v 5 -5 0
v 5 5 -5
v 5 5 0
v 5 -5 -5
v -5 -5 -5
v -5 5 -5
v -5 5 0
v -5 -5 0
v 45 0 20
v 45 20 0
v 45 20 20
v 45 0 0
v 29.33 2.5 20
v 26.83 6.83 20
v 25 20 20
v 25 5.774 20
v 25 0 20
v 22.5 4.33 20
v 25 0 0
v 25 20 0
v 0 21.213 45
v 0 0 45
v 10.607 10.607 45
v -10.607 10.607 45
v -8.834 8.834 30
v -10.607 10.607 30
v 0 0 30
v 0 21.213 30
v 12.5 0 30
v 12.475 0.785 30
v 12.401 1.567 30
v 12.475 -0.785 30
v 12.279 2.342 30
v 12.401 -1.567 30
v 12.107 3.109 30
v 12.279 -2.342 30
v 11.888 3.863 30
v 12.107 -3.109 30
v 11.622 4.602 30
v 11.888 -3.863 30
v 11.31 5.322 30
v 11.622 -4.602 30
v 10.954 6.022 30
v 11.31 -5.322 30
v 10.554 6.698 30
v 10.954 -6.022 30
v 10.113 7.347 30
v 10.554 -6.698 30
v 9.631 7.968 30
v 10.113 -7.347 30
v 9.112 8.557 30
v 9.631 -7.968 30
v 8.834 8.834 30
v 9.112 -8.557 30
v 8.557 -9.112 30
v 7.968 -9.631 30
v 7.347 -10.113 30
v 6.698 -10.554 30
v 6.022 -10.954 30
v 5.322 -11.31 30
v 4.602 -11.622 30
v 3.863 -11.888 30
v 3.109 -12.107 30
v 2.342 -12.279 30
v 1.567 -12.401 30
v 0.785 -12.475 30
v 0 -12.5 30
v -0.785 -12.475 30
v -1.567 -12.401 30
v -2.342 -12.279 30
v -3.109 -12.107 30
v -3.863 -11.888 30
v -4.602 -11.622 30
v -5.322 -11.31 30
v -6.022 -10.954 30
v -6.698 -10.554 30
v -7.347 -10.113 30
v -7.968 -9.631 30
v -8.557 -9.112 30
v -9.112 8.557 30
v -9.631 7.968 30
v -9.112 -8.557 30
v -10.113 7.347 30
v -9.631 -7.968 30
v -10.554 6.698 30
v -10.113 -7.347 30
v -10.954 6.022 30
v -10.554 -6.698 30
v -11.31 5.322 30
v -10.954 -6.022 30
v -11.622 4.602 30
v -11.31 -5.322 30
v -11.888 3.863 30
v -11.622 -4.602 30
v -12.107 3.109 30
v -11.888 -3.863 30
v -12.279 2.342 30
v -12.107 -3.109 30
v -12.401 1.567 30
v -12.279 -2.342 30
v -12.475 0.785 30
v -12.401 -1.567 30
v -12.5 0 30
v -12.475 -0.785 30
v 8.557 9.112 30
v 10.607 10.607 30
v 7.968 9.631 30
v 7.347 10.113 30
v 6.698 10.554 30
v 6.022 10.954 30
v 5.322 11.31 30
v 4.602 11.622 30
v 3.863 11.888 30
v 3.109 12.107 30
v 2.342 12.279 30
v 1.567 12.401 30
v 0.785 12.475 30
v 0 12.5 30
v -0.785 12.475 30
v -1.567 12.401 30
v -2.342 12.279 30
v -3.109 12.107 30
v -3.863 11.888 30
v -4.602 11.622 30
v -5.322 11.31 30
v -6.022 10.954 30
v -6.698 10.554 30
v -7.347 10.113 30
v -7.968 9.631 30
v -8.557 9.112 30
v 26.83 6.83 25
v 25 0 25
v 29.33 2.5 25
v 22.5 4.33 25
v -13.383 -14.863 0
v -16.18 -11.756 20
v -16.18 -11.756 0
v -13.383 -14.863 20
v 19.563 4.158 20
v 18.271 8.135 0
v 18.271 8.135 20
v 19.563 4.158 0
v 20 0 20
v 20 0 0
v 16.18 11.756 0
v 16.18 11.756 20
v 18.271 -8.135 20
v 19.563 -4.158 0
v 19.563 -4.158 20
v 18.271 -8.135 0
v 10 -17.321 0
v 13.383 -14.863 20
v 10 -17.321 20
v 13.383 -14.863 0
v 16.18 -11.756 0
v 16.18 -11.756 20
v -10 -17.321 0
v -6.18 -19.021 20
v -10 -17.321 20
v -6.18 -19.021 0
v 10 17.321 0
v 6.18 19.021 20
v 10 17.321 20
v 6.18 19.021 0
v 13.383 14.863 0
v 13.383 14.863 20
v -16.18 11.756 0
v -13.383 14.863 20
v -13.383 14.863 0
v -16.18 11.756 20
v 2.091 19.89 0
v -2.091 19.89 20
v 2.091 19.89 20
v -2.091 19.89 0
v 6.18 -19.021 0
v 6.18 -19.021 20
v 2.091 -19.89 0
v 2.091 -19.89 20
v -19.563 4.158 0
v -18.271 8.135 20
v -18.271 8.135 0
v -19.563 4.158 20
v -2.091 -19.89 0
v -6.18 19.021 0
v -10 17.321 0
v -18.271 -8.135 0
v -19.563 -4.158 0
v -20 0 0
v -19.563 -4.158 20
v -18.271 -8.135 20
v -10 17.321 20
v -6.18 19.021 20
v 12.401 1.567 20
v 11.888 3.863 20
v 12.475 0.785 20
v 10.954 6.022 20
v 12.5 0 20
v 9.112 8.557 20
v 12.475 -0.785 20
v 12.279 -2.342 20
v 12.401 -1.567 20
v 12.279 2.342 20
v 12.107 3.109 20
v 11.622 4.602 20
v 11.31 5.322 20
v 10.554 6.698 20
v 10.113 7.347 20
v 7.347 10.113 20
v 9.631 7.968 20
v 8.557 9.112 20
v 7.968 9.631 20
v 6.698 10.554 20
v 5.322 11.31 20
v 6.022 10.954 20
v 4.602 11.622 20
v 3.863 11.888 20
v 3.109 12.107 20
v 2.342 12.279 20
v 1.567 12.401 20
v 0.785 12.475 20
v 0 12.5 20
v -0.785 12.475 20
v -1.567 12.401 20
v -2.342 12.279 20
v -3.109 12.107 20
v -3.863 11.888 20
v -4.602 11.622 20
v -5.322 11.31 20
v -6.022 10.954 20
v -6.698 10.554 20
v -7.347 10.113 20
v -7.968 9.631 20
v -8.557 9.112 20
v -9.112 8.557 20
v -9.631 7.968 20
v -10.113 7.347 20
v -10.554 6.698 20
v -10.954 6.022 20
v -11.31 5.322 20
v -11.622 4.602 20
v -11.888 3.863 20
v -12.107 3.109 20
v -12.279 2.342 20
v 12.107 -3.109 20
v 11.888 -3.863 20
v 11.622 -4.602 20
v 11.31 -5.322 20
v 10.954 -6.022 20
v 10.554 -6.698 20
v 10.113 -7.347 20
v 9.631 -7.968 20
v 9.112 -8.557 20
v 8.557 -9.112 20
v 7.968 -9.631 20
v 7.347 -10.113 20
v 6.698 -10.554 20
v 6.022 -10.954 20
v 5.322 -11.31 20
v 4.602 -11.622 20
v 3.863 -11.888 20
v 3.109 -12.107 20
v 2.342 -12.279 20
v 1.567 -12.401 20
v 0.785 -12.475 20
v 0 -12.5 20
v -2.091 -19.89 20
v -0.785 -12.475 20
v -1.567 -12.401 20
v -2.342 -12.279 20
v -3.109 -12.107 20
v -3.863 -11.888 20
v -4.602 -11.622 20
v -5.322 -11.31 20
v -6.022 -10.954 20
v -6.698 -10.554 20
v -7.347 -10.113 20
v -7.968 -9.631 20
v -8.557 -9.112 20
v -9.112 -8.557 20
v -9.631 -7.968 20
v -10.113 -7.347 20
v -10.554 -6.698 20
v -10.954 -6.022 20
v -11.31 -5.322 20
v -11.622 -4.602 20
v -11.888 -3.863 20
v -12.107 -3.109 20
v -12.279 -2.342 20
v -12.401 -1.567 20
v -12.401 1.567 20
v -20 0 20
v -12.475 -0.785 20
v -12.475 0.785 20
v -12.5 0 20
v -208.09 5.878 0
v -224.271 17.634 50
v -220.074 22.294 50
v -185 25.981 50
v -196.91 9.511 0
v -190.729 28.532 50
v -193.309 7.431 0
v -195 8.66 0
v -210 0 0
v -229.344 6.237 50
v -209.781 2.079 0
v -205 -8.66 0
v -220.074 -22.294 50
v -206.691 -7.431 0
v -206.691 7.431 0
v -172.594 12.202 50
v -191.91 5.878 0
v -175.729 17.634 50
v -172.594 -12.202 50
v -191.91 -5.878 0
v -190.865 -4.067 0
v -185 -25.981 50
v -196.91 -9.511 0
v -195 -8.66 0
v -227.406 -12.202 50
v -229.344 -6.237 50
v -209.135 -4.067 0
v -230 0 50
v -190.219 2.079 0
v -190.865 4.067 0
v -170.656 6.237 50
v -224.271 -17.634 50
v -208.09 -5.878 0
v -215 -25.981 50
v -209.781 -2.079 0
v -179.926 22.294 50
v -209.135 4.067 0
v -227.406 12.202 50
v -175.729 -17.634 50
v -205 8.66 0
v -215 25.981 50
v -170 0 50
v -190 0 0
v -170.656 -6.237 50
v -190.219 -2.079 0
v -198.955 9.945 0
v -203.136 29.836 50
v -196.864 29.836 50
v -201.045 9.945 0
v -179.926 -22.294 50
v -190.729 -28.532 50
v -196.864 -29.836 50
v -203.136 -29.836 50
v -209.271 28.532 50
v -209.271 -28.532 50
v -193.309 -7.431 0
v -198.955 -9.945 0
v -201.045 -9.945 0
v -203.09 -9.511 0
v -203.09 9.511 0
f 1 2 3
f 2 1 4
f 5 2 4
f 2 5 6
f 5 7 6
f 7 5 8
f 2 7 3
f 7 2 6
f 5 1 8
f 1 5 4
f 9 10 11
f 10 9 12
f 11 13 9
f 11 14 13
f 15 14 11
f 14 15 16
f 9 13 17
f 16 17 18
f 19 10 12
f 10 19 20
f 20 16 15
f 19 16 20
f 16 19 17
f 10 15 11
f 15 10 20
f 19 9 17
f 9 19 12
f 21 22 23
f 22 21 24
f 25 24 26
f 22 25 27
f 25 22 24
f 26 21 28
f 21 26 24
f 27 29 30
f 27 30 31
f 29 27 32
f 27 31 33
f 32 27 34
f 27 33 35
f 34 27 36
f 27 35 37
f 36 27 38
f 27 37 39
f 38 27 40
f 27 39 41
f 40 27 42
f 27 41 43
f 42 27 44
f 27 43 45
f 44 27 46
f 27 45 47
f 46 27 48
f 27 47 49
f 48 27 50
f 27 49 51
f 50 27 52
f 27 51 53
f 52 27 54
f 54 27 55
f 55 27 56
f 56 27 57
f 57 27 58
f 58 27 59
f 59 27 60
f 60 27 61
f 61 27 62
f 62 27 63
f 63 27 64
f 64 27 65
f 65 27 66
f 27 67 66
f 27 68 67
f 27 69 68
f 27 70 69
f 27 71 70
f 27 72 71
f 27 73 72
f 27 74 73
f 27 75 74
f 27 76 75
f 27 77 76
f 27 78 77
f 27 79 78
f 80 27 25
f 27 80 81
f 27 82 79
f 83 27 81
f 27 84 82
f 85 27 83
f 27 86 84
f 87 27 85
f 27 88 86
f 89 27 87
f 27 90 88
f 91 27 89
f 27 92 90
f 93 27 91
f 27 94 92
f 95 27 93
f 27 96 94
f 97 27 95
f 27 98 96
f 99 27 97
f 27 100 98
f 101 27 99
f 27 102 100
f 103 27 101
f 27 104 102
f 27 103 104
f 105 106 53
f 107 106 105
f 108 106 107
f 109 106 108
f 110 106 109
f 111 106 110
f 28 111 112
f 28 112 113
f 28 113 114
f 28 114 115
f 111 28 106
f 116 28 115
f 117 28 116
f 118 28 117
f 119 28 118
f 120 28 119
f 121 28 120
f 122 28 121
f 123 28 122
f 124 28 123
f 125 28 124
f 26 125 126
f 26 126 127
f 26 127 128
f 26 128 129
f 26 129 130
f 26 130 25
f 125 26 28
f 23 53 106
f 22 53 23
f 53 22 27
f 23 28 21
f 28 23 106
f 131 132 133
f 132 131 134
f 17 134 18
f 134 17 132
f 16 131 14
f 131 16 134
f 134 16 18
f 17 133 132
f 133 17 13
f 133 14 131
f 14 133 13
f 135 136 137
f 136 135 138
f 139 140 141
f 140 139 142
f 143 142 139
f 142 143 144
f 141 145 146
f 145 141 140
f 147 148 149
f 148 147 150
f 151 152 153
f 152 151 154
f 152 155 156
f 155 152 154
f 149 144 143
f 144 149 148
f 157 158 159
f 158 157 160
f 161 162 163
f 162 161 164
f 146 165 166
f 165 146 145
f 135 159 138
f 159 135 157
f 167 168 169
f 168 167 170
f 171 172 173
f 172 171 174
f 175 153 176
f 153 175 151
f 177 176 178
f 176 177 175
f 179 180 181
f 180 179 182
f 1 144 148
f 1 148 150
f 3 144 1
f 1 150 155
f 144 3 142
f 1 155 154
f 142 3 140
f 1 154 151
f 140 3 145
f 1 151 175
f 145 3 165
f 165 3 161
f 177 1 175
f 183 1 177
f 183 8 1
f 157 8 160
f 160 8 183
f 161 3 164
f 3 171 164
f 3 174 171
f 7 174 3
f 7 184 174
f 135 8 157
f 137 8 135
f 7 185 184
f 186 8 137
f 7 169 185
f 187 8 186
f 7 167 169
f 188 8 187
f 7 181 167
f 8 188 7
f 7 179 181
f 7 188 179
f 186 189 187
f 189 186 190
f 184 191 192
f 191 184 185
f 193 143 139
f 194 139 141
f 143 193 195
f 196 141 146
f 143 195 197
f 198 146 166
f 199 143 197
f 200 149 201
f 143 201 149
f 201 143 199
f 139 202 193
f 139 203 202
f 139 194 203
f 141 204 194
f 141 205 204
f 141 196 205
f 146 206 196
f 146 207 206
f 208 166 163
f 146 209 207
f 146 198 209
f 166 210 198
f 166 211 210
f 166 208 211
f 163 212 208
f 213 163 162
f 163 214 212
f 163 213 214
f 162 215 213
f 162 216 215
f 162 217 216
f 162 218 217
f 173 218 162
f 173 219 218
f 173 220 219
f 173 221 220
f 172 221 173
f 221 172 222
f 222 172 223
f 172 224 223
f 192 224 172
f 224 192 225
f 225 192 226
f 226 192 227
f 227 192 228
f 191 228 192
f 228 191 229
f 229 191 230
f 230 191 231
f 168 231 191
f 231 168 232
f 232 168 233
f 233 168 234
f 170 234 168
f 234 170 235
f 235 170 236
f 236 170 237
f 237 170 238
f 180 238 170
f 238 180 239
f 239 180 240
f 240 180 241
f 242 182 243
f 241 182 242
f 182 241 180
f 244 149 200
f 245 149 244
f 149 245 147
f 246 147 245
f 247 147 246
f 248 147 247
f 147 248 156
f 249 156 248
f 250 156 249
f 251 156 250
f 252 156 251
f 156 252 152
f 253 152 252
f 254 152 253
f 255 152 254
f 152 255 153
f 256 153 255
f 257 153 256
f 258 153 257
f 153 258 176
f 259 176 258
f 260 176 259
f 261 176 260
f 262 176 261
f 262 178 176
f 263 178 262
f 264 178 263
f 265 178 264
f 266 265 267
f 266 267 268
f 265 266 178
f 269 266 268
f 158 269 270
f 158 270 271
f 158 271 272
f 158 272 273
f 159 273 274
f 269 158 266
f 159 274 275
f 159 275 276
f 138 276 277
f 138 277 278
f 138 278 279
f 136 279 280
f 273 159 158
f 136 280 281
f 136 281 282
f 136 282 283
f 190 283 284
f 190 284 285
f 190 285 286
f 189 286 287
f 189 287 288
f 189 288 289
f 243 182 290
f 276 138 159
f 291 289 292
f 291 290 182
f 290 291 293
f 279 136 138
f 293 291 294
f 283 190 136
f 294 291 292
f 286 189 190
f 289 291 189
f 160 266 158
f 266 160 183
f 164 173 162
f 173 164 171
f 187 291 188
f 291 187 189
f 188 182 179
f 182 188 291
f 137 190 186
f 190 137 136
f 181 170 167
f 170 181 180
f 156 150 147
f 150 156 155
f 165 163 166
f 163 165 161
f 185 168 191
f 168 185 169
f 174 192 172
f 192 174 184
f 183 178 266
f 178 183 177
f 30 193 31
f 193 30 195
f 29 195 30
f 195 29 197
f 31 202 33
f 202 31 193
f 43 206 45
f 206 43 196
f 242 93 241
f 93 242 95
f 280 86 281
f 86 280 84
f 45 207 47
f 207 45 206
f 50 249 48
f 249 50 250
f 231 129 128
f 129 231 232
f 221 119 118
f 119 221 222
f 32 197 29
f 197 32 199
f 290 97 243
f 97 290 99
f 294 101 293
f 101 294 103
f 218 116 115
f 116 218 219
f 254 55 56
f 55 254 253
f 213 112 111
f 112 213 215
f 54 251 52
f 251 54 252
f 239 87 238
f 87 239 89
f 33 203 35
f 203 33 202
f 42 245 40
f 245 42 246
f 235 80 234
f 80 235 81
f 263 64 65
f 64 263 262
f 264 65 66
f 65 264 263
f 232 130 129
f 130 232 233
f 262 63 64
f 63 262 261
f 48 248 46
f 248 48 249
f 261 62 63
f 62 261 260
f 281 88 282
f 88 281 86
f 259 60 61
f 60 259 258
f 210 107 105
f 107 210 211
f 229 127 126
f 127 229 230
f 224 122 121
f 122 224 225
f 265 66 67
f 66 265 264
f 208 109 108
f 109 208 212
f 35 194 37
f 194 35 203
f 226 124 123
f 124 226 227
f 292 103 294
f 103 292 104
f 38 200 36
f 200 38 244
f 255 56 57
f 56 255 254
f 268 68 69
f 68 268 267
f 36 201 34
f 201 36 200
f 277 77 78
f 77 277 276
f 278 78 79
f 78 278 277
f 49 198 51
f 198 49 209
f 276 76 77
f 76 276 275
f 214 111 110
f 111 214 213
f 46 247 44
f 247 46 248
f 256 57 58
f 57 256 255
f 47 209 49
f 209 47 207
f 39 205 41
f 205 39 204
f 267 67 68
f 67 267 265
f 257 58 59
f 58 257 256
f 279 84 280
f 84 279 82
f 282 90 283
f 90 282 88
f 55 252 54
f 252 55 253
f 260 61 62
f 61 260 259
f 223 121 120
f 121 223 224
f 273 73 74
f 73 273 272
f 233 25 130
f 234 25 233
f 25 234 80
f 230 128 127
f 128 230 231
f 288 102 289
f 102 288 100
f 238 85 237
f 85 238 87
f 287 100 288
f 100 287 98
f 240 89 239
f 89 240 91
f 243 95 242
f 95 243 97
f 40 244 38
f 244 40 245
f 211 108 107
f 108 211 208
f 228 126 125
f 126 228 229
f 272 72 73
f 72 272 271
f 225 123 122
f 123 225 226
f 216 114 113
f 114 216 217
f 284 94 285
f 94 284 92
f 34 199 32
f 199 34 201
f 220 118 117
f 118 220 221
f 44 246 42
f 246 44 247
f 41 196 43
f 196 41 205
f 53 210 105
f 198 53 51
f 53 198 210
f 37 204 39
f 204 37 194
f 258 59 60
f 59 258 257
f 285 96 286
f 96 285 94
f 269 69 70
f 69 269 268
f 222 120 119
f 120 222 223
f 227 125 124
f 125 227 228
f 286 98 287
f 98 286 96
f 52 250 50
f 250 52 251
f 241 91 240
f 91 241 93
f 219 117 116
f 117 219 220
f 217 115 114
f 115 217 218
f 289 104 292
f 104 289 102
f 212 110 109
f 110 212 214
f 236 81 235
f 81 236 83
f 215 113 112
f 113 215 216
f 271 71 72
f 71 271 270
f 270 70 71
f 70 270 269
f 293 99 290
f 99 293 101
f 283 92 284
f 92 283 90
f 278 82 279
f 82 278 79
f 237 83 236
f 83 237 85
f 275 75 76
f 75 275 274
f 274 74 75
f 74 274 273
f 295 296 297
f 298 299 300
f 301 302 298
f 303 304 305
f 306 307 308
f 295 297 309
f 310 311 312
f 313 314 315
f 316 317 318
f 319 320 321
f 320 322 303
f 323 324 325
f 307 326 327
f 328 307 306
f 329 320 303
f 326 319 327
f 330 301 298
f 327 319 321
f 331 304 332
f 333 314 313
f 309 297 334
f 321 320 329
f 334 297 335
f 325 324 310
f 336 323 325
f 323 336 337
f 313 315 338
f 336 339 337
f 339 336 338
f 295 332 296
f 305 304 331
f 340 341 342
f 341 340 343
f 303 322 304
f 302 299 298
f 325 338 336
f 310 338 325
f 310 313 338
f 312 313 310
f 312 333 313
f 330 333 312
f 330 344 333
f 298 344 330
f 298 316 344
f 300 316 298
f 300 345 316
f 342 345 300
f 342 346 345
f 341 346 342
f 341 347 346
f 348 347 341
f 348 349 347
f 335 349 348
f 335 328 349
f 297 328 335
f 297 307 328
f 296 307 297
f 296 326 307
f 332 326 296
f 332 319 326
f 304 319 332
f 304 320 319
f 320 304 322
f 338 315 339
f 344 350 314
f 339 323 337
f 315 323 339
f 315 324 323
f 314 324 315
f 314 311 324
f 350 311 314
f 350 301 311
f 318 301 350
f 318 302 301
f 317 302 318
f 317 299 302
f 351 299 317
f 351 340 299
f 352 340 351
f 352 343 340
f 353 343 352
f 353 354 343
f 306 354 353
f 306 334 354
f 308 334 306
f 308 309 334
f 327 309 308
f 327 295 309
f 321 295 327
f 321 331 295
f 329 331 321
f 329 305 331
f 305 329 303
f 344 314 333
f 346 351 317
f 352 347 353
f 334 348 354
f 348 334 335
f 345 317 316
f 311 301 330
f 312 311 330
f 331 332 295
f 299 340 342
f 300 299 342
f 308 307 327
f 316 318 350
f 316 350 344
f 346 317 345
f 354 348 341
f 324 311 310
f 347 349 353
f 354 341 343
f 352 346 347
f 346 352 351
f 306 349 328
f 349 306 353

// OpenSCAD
// hola mundo OpenScad
// cubo centrado en el origen
cube([10,10,10],center=true);


// Lo movemos del origen
color("cyan")
translate([25,0,0])
    cube([20,20,20]);
    
// primero lo movemos y luego lo rotamos    
color([1,0,0,1])
rotate([0,0,45])
  translate([0,0,30])
    cube([15,15,15]);


// ahora primero trasladamos y luego rotamos
color([0,1,0,1])
    translate([25,0,20])
        rotate([0,0,30])
            cube([5,5,5]);


// Empezamos con los cilindros

color("magenta")
    cylinder(r=20,h=20);

// un cilindro con más facetas

color("pink")
    translate([0,-0,0])
        cylinder(r=25/2,h=30,$fn=100);

// Podemos hacer un tronco de cono con el cilindro

color("lightblue")
    translate([-200,0,0])
        cylinder(r1=10,r2=30,h=50);
